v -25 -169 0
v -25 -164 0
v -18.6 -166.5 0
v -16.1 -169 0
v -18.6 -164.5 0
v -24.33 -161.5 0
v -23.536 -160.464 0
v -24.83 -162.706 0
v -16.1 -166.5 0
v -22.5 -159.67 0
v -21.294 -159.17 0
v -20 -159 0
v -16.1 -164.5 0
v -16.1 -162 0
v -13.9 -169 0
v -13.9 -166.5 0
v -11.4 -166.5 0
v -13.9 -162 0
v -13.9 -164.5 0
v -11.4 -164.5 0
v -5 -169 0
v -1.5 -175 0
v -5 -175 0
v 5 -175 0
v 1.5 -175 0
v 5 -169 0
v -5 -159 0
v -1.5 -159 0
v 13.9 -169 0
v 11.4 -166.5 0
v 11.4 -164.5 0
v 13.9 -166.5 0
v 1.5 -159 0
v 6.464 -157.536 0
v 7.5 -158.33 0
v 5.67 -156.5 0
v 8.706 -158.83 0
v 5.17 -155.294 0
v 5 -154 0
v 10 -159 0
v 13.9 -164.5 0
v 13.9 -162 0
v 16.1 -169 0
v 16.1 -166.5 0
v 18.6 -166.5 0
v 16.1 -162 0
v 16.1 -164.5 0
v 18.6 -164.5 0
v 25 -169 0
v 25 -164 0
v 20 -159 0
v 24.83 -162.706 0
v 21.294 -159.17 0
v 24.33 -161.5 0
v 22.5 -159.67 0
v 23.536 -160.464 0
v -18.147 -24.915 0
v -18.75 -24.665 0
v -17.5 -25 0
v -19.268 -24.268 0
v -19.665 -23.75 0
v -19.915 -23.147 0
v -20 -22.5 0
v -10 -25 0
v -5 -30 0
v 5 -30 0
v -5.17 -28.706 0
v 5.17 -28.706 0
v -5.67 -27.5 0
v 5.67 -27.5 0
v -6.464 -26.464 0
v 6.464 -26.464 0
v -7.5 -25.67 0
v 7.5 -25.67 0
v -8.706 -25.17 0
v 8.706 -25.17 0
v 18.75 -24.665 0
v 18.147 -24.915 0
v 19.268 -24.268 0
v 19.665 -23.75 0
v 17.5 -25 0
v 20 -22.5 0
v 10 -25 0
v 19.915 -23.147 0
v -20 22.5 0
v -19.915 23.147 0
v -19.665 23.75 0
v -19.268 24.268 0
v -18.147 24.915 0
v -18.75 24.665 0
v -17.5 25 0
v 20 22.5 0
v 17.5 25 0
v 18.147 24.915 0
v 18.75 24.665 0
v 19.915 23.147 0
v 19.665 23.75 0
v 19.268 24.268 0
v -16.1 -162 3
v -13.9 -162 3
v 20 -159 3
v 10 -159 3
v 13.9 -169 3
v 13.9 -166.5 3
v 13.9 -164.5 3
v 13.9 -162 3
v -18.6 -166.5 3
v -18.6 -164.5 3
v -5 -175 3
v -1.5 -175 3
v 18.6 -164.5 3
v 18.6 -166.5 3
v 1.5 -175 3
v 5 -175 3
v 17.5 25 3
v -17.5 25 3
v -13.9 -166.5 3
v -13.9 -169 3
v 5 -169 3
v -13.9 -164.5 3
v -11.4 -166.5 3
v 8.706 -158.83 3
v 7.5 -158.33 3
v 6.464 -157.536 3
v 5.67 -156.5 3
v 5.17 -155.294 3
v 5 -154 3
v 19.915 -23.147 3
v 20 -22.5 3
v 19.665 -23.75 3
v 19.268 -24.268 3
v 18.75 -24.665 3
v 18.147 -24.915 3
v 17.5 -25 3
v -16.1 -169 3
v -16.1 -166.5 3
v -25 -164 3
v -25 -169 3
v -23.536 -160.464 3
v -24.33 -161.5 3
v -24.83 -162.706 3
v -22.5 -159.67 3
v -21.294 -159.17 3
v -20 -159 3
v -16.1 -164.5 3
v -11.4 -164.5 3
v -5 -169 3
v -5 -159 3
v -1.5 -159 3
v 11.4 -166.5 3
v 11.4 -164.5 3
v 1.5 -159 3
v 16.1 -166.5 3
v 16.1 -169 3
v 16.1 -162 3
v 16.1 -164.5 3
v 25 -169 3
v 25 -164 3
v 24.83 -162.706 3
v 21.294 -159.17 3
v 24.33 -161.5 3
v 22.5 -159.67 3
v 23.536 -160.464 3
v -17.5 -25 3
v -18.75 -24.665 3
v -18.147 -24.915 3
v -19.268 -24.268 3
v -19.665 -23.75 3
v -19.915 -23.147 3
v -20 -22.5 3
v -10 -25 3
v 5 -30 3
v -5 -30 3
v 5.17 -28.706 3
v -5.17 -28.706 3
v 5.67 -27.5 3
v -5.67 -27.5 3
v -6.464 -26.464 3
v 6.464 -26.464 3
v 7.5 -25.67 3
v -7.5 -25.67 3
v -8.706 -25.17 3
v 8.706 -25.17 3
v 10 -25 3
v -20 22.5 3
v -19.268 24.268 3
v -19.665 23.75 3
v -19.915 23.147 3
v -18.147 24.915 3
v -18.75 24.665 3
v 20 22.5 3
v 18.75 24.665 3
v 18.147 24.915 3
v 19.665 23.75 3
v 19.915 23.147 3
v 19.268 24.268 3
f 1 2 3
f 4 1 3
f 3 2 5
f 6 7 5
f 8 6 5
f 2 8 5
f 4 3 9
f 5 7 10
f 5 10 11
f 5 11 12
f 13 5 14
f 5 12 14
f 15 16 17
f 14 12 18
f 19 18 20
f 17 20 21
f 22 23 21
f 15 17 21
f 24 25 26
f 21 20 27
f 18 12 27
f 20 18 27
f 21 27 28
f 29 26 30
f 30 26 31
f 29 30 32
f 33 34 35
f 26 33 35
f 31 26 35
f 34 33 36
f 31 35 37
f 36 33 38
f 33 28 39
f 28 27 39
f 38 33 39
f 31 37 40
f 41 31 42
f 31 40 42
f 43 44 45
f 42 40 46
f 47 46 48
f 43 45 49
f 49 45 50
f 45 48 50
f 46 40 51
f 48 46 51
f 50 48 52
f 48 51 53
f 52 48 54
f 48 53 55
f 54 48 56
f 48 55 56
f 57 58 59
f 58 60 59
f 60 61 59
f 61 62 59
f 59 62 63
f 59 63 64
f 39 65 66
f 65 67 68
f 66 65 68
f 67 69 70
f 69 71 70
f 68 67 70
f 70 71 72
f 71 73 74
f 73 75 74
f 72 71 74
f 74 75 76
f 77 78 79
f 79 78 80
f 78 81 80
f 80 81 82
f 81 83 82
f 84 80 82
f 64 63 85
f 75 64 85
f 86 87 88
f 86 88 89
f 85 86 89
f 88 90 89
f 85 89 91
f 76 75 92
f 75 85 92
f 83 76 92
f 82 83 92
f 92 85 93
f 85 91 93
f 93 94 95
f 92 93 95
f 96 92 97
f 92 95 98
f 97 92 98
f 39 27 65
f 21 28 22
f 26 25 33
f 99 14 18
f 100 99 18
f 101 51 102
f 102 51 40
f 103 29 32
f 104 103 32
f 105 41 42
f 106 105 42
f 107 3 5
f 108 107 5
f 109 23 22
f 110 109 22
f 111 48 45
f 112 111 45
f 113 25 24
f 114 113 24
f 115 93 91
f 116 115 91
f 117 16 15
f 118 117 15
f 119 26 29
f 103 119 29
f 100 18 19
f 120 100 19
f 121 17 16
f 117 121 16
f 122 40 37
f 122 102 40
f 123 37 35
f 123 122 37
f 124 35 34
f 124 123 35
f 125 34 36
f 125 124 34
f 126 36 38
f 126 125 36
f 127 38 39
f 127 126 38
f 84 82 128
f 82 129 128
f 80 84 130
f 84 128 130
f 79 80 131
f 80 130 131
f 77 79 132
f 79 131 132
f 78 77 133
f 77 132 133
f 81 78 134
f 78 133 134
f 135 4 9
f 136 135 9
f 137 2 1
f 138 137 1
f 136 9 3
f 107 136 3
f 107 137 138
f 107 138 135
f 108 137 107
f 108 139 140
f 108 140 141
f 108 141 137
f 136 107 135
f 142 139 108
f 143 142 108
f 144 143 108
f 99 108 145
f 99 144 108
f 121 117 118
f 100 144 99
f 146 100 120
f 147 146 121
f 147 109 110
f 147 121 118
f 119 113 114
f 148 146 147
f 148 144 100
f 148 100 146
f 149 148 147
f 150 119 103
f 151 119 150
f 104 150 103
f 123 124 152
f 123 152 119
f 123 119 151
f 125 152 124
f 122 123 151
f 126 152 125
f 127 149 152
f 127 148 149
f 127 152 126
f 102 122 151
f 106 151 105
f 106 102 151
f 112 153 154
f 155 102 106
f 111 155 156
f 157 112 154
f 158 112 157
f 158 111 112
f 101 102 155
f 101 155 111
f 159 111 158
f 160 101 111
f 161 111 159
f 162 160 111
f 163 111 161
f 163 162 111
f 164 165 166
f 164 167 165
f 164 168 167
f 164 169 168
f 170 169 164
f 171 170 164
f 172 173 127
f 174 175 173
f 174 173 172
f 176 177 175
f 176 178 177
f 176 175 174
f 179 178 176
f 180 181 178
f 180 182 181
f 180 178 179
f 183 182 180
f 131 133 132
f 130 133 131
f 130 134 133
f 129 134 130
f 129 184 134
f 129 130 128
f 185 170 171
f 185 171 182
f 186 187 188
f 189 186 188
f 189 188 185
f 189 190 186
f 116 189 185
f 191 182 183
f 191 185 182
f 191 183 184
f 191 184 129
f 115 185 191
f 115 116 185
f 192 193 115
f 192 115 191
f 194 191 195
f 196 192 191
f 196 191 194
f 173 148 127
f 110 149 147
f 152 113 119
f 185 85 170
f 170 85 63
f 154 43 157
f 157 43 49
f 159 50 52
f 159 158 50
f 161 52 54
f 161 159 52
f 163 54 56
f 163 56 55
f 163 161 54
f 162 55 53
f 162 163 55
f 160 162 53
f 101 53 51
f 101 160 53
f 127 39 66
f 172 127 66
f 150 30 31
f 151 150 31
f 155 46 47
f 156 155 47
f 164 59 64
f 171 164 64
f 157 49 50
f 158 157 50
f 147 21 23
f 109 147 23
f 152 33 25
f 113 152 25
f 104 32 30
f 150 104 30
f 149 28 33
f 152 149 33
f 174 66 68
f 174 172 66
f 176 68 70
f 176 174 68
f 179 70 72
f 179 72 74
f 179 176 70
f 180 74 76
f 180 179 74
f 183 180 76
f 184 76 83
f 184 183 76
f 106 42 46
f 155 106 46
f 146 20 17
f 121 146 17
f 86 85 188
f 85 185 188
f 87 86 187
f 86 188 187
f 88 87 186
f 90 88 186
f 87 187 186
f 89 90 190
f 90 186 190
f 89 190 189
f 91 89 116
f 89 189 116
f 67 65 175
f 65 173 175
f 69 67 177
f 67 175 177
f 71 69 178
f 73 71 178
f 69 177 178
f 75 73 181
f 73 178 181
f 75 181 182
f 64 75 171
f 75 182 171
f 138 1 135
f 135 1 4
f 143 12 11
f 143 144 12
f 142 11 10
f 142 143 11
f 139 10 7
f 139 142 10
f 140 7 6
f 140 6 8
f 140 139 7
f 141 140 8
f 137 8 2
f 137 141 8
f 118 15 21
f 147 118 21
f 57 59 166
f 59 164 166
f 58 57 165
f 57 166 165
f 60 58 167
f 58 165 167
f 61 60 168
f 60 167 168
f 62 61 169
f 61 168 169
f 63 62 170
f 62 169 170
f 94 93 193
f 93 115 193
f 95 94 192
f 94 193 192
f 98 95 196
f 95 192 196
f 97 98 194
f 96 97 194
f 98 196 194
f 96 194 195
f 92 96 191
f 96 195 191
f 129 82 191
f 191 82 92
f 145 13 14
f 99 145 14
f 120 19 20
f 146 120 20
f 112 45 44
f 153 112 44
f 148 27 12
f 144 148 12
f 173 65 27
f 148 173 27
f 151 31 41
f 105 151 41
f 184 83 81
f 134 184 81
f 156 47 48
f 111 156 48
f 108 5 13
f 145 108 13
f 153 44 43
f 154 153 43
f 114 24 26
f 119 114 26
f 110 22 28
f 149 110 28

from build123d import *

# Parameters (mm, degrees)
BOSS_EXTRUDE1_DEPTH = 3
FILLET1_R           = 5
FILLET2_R           = 2.5


with BuildPart() as part:
    # Sketch1 → Boss-Extrude1 (new body)
    with BuildSketch(Plane.XY):
        Polygon((-5, -25), (-5, -159), (-25, -159), (-25, -169), (-16.1, -169), (-16.1, -166.5), (-18.6, -166.5), (-18.6, -164.5), (-16.1, -164.5), (-16.1, -162), (-13.9, -162), (-13.9, -164.5), (-11.4, -164.5), (-11.4, -166.5), (-13.9, -166.5), (-13.9, -169), (-5, -169), (-5, -175), (-1.5, -175), (-1.5, -159), (1.5, -159), (1.5, -175), (5, -175), (5, -169), (13.9, -169), (13.9, -166.5), (11.4, -166.5), (11.4, -164.5), (13.9, -164.5), (13.9, -162), (16.1, -162), (16.1, -164.5), (18.6, -164.5), (18.6, -166.5), (16.1, -166.5), (16.1, -169), (25, -169), (25, -159), (5, -159), (5, -25), (20, -25), (20, 25), (0, 25), (-20, 25), (-20, -25), align=None)
    extrude(amount=BOSS_EXTRUDE1_DEPTH)

    # Fillet1
    fillet1_edges = [part.edges().sort_by_distance(p)[0] for p in [
        (5, -25, 1.5),
        (5, -159, 1.5),
        (25, -159, 1.5),
        (-25, -159, 1.5),
        (-5, -25, 1.5),
    ]]
    fillet(fillet1_edges, radius=FILLET1_R)

    # Fillet2
    fillet2_edges = [part.edges().sort_by_distance(p)[0] for p in [
        (-20, -25, 1.5),
        (-20, 25, 1.5),
        (20, 25, 1.5),
        (20, -25, 1.5),
    ]]
    fillet(fillet2_edges, radius=FILLET2_R)


solid = part.part
